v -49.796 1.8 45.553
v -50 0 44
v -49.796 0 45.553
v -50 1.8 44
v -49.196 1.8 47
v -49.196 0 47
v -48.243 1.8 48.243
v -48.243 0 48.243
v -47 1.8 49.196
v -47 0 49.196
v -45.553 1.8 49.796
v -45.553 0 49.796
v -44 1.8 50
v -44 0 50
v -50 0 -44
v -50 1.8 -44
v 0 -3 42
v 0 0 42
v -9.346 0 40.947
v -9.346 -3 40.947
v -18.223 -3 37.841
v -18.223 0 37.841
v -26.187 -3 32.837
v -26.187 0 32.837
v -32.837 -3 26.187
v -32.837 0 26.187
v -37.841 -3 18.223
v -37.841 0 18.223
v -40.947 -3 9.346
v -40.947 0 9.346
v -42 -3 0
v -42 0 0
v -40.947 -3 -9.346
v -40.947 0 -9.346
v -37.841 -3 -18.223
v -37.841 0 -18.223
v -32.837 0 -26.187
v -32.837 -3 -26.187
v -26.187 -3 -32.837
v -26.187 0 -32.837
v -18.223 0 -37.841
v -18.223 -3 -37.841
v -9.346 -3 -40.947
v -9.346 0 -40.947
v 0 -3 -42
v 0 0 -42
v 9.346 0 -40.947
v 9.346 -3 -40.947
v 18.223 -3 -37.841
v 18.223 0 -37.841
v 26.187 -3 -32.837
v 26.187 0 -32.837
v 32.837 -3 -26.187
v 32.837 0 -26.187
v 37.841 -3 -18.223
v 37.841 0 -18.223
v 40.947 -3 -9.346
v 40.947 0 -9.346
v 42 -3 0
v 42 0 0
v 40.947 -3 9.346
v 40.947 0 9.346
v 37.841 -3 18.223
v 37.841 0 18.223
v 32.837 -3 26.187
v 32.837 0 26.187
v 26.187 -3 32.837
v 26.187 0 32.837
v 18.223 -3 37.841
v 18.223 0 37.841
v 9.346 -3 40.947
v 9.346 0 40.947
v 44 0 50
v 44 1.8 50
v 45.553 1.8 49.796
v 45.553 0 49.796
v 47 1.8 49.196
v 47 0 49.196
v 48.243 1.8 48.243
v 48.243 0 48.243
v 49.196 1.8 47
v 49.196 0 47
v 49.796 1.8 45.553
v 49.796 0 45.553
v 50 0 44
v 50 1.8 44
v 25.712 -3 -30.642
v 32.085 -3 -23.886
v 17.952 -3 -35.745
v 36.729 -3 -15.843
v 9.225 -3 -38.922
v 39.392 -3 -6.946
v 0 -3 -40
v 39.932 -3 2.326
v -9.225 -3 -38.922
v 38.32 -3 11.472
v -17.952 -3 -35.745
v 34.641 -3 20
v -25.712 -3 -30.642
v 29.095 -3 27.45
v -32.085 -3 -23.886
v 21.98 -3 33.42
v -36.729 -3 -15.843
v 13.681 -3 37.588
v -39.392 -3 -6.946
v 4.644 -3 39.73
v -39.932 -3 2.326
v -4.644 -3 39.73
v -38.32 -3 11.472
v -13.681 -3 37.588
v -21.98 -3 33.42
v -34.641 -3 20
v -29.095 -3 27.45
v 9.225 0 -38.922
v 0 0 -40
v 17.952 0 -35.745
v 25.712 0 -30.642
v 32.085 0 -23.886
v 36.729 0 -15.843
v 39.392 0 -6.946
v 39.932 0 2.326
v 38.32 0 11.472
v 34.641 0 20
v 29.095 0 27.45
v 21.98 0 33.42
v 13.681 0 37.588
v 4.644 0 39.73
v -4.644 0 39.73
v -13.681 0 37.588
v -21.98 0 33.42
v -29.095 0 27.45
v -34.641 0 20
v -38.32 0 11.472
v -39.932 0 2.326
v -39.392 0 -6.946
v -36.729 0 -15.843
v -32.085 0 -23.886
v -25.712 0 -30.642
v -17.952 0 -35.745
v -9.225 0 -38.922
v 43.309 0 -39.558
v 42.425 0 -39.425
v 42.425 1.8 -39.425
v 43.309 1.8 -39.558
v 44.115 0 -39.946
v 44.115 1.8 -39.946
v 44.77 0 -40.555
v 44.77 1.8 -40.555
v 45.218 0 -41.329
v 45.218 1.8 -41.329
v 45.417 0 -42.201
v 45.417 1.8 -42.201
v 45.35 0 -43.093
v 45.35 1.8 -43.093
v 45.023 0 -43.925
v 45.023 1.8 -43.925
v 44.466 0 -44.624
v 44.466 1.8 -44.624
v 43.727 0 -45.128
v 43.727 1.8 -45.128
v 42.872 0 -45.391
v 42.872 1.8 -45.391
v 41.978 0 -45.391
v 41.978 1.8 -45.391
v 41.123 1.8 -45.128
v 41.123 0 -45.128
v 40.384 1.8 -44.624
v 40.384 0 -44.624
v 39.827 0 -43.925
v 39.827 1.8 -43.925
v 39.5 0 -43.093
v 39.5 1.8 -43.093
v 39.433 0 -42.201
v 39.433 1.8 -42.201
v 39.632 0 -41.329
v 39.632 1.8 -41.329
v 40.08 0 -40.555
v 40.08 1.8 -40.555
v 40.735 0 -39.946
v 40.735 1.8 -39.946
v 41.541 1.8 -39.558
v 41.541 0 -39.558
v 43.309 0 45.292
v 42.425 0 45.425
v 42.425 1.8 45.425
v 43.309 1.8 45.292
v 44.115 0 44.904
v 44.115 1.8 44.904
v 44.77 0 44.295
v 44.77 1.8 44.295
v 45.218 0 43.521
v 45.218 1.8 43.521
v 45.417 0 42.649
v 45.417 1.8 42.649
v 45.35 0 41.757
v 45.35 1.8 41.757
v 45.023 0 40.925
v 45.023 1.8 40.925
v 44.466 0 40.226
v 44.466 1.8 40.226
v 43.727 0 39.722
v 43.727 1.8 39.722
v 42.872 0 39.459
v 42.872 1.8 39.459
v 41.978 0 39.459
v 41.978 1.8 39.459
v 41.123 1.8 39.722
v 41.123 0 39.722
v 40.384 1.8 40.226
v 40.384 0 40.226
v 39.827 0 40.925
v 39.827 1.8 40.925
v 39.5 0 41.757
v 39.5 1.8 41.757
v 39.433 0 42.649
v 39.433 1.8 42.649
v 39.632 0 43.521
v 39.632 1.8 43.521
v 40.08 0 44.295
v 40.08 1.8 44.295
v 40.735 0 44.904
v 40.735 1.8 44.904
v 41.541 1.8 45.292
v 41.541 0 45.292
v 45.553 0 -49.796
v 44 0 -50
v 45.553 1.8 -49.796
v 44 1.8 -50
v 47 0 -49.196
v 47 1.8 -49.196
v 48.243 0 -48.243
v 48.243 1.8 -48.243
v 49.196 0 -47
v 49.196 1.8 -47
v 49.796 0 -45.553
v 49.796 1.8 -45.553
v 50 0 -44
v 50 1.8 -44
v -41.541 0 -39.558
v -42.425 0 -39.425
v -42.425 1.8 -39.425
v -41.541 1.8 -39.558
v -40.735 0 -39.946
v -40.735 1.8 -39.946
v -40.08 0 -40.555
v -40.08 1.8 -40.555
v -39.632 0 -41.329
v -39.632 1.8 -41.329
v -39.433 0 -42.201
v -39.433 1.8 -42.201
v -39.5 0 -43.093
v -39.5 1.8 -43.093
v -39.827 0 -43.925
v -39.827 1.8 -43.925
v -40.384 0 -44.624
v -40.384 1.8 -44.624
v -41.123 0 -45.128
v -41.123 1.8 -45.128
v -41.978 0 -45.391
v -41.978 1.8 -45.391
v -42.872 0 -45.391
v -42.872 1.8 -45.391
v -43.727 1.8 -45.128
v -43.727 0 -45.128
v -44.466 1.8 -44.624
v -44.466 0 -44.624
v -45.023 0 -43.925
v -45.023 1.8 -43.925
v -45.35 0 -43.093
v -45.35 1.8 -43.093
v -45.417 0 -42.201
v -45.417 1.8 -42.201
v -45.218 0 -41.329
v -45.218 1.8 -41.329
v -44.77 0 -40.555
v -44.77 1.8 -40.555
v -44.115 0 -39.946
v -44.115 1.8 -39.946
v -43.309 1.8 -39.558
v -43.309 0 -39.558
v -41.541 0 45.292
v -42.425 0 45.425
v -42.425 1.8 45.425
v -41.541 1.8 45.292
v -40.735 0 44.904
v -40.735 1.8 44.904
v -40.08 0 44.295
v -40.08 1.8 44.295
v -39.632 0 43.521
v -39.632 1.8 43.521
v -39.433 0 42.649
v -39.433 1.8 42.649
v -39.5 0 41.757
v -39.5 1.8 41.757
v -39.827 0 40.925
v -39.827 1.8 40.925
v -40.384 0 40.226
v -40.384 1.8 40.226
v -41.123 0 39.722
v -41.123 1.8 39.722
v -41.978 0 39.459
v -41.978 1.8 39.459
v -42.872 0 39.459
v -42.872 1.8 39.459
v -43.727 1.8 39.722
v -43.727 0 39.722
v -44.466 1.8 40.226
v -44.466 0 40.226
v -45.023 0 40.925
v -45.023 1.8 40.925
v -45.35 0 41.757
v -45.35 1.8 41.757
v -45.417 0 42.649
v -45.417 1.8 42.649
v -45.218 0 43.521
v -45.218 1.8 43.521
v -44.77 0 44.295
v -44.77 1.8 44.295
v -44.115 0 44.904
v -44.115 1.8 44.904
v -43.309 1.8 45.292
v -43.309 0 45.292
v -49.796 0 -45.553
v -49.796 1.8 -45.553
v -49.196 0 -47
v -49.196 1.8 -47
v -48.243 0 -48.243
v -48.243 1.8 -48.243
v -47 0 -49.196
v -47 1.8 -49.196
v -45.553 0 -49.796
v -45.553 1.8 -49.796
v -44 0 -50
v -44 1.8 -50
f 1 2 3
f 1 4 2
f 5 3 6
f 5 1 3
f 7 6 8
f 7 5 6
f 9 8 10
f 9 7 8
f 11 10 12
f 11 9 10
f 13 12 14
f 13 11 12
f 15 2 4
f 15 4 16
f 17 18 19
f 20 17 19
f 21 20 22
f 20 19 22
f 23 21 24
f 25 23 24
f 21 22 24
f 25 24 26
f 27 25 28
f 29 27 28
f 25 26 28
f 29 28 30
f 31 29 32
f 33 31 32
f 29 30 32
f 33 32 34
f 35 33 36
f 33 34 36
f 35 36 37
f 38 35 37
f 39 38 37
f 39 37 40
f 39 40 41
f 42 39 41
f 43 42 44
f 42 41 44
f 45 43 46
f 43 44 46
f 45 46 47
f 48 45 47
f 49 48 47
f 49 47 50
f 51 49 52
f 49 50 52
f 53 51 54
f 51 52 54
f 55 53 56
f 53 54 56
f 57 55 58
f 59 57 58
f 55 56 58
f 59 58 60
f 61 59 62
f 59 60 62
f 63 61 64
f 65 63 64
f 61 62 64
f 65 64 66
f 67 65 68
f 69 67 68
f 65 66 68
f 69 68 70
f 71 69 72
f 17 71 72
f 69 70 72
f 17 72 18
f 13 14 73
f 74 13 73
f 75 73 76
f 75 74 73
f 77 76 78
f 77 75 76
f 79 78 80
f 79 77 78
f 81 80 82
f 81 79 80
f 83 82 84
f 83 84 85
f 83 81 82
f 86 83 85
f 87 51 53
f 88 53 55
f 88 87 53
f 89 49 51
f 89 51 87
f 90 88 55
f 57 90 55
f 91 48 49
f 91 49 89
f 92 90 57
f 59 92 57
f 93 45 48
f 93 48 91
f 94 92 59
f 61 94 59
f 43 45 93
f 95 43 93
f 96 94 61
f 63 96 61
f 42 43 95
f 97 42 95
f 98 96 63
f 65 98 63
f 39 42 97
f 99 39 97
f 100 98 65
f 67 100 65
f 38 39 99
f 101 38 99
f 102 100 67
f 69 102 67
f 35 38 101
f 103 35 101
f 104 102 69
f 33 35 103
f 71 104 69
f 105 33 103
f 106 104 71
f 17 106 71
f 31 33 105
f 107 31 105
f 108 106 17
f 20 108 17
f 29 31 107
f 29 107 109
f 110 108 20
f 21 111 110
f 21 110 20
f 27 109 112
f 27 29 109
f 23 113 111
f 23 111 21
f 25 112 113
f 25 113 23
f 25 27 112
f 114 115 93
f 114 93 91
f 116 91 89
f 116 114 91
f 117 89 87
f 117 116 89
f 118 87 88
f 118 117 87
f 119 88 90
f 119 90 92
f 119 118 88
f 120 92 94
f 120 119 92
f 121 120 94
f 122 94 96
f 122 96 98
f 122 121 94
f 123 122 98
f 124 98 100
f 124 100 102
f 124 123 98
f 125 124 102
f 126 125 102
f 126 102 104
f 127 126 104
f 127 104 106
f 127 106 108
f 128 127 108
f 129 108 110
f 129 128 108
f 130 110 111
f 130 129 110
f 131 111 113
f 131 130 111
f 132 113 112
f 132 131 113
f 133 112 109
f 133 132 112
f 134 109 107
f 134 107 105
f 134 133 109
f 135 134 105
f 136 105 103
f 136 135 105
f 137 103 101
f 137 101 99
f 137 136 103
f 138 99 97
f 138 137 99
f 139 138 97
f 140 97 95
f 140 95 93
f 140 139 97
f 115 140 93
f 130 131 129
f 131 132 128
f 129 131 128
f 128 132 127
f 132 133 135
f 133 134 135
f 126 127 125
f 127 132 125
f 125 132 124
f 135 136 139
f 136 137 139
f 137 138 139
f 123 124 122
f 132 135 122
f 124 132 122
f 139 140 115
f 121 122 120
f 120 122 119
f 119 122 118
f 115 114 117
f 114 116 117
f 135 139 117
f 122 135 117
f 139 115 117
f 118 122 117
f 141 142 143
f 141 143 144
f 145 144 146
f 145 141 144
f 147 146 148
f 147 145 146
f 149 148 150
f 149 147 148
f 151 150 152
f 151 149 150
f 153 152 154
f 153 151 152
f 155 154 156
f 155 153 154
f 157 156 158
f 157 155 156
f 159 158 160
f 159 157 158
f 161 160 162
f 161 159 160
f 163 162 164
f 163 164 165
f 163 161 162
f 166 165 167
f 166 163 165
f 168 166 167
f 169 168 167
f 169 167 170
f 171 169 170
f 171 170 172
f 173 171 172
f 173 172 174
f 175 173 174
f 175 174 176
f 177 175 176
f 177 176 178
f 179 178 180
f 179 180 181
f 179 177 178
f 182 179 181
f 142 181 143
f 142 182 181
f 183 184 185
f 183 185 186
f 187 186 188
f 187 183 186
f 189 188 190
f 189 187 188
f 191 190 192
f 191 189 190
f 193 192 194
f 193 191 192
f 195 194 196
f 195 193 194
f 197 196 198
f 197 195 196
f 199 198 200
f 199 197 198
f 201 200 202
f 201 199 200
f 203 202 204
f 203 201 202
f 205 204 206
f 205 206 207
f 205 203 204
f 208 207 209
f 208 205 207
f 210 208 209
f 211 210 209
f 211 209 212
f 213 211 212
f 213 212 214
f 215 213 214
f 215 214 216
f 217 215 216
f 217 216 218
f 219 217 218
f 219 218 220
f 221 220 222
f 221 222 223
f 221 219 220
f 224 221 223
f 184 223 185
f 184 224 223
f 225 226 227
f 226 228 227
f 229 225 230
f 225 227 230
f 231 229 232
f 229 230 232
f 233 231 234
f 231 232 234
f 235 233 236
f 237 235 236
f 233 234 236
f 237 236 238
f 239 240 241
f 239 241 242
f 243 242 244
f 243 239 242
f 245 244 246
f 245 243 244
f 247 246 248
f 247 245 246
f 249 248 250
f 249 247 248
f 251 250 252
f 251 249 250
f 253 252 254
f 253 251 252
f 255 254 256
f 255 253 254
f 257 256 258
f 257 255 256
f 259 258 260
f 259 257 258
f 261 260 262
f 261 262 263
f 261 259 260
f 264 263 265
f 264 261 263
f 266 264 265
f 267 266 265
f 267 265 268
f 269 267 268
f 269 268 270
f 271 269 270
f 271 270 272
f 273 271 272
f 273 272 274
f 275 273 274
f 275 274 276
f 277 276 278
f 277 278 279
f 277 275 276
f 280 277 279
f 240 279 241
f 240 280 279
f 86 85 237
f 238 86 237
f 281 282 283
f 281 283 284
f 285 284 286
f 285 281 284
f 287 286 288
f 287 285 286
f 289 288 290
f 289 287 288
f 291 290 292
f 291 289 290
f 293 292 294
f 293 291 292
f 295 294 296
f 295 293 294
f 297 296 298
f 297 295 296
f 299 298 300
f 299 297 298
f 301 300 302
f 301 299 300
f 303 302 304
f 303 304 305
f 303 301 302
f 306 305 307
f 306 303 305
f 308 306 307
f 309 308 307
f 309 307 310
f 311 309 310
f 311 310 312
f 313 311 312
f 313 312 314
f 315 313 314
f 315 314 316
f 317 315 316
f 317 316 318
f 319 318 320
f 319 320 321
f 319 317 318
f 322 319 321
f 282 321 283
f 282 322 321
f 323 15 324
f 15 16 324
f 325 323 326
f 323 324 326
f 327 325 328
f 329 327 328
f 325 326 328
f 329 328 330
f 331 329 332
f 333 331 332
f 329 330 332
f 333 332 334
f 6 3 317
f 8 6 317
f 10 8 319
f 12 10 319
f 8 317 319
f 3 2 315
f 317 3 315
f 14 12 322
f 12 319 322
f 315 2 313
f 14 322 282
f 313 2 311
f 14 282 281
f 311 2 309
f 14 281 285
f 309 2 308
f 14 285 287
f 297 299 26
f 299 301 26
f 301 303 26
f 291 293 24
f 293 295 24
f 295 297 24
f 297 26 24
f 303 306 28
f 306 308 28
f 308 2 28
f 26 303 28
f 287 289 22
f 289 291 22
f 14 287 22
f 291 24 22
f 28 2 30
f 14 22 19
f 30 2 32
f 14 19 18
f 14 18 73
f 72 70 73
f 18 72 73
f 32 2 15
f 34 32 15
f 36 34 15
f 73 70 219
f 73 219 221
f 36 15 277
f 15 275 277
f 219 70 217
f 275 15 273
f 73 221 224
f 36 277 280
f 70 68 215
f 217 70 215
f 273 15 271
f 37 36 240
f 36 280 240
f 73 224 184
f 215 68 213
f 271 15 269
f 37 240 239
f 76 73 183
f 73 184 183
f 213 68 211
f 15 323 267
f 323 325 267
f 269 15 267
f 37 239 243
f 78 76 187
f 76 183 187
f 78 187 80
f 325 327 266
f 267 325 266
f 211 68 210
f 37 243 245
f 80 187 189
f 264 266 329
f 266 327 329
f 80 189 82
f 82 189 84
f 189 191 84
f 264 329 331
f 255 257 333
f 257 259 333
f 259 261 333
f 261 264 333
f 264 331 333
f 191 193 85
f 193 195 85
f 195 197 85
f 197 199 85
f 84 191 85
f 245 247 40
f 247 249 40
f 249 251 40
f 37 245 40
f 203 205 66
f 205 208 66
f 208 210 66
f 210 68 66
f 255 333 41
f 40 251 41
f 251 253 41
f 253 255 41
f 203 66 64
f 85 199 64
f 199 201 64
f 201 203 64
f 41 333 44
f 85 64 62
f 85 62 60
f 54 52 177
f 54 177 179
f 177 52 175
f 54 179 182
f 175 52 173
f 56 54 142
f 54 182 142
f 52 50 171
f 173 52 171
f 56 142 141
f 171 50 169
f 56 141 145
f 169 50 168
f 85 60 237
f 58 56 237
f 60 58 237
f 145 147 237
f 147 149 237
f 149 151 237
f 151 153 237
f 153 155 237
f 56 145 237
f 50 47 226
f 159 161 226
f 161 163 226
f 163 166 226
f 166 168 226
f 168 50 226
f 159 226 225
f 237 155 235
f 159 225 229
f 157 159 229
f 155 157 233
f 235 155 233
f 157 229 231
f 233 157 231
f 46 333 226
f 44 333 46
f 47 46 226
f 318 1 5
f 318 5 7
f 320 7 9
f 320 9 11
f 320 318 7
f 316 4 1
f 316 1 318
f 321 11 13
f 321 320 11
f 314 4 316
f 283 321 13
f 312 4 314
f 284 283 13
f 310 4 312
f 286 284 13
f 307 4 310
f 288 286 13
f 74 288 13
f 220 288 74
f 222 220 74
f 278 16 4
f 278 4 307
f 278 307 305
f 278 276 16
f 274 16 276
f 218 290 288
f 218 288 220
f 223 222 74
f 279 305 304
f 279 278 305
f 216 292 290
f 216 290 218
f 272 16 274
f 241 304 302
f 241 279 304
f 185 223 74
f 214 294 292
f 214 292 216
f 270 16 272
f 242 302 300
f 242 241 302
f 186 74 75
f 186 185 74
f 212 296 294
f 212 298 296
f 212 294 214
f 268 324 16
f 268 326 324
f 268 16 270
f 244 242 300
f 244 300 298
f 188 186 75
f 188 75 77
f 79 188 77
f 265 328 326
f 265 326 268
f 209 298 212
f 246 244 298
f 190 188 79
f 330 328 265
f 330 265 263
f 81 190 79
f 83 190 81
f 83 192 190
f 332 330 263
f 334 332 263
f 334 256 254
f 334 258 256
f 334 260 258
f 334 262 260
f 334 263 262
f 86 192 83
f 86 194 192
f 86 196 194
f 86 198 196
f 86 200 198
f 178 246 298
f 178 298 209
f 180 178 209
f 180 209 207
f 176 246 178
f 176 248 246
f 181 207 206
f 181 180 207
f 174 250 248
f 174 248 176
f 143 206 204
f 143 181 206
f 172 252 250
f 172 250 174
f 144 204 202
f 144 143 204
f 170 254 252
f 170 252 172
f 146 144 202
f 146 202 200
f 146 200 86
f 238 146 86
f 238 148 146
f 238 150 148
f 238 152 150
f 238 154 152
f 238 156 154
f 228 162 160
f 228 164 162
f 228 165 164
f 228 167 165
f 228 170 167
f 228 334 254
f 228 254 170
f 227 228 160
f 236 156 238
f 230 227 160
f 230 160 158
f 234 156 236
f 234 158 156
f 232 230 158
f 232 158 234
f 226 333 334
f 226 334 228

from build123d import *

# Parameters (mm, degrees)
SKETCH2_W           = 100
SKETCH2_H           = 100
SKETCH2_R           = 3
BOSS_EXTRUDE1_DEPTH = 1.8
FILLET1_R           = 6
SKETCH3_R           = 42
SKETCH3_R_2         = 40
BOSS_EXTRUDE2_DEPTH = 3


with BuildPart() as part:
    # Sketch2 → Boss-Extrude1 (new body)
    with BuildSketch(Plane(origin=(0, 0, 0), x_dir=(1, 0, 0), z_dir=(0, 1, 0))):
        Rectangle(SKETCH2_W, SKETCH2_H)
        with Locations(Location((-42.425, 42.425, 0), (0, 0, 270))):
            Circle(SKETCH2_R, mode=Mode.SUBTRACT)
        with Locations(Location((42.425, 42.425, 0), (0, 0, 270))):
            Circle(SKETCH2_R, mode=Mode.SUBTRACT)
        with Locations(Location((42.425, -42.425, 0), (0, 0, 270))):
            Circle(SKETCH2_R, mode=Mode.SUBTRACT)
        with Locations(Location((-42.425, -42.425, 0), (0, 0, 270))):
            Circle(SKETCH2_R, mode=Mode.SUBTRACT)
    extrude(amount=BOSS_EXTRUDE1_DEPTH)

    # Fillet1
    fillet1_edges = [part.edges().sort_by_distance(p)[0] for p in [
        (50, 0.9, 50),
        (-50, 0.9, 50),
        (-50, 0.9, -50),
        (50, 0.9, -50),
    ]]
    fillet(fillet1_edges, radius=FILLET1_R)

    # Sketch3 → Boss-Extrude2 (add)
    with BuildSketch(Plane.XZ):
        with Locations(Location((0, 0, 0), (0, 0, 90))):
            Circle(SKETCH3_R)
        with Locations(Location((0, 0, 0), (0, 0, 270))):
            Circle(SKETCH3_R_2, mode=Mode.SUBTRACT)
    extrude(amount=BOSS_EXTRUDE2_DEPTH)


solid = part.part
